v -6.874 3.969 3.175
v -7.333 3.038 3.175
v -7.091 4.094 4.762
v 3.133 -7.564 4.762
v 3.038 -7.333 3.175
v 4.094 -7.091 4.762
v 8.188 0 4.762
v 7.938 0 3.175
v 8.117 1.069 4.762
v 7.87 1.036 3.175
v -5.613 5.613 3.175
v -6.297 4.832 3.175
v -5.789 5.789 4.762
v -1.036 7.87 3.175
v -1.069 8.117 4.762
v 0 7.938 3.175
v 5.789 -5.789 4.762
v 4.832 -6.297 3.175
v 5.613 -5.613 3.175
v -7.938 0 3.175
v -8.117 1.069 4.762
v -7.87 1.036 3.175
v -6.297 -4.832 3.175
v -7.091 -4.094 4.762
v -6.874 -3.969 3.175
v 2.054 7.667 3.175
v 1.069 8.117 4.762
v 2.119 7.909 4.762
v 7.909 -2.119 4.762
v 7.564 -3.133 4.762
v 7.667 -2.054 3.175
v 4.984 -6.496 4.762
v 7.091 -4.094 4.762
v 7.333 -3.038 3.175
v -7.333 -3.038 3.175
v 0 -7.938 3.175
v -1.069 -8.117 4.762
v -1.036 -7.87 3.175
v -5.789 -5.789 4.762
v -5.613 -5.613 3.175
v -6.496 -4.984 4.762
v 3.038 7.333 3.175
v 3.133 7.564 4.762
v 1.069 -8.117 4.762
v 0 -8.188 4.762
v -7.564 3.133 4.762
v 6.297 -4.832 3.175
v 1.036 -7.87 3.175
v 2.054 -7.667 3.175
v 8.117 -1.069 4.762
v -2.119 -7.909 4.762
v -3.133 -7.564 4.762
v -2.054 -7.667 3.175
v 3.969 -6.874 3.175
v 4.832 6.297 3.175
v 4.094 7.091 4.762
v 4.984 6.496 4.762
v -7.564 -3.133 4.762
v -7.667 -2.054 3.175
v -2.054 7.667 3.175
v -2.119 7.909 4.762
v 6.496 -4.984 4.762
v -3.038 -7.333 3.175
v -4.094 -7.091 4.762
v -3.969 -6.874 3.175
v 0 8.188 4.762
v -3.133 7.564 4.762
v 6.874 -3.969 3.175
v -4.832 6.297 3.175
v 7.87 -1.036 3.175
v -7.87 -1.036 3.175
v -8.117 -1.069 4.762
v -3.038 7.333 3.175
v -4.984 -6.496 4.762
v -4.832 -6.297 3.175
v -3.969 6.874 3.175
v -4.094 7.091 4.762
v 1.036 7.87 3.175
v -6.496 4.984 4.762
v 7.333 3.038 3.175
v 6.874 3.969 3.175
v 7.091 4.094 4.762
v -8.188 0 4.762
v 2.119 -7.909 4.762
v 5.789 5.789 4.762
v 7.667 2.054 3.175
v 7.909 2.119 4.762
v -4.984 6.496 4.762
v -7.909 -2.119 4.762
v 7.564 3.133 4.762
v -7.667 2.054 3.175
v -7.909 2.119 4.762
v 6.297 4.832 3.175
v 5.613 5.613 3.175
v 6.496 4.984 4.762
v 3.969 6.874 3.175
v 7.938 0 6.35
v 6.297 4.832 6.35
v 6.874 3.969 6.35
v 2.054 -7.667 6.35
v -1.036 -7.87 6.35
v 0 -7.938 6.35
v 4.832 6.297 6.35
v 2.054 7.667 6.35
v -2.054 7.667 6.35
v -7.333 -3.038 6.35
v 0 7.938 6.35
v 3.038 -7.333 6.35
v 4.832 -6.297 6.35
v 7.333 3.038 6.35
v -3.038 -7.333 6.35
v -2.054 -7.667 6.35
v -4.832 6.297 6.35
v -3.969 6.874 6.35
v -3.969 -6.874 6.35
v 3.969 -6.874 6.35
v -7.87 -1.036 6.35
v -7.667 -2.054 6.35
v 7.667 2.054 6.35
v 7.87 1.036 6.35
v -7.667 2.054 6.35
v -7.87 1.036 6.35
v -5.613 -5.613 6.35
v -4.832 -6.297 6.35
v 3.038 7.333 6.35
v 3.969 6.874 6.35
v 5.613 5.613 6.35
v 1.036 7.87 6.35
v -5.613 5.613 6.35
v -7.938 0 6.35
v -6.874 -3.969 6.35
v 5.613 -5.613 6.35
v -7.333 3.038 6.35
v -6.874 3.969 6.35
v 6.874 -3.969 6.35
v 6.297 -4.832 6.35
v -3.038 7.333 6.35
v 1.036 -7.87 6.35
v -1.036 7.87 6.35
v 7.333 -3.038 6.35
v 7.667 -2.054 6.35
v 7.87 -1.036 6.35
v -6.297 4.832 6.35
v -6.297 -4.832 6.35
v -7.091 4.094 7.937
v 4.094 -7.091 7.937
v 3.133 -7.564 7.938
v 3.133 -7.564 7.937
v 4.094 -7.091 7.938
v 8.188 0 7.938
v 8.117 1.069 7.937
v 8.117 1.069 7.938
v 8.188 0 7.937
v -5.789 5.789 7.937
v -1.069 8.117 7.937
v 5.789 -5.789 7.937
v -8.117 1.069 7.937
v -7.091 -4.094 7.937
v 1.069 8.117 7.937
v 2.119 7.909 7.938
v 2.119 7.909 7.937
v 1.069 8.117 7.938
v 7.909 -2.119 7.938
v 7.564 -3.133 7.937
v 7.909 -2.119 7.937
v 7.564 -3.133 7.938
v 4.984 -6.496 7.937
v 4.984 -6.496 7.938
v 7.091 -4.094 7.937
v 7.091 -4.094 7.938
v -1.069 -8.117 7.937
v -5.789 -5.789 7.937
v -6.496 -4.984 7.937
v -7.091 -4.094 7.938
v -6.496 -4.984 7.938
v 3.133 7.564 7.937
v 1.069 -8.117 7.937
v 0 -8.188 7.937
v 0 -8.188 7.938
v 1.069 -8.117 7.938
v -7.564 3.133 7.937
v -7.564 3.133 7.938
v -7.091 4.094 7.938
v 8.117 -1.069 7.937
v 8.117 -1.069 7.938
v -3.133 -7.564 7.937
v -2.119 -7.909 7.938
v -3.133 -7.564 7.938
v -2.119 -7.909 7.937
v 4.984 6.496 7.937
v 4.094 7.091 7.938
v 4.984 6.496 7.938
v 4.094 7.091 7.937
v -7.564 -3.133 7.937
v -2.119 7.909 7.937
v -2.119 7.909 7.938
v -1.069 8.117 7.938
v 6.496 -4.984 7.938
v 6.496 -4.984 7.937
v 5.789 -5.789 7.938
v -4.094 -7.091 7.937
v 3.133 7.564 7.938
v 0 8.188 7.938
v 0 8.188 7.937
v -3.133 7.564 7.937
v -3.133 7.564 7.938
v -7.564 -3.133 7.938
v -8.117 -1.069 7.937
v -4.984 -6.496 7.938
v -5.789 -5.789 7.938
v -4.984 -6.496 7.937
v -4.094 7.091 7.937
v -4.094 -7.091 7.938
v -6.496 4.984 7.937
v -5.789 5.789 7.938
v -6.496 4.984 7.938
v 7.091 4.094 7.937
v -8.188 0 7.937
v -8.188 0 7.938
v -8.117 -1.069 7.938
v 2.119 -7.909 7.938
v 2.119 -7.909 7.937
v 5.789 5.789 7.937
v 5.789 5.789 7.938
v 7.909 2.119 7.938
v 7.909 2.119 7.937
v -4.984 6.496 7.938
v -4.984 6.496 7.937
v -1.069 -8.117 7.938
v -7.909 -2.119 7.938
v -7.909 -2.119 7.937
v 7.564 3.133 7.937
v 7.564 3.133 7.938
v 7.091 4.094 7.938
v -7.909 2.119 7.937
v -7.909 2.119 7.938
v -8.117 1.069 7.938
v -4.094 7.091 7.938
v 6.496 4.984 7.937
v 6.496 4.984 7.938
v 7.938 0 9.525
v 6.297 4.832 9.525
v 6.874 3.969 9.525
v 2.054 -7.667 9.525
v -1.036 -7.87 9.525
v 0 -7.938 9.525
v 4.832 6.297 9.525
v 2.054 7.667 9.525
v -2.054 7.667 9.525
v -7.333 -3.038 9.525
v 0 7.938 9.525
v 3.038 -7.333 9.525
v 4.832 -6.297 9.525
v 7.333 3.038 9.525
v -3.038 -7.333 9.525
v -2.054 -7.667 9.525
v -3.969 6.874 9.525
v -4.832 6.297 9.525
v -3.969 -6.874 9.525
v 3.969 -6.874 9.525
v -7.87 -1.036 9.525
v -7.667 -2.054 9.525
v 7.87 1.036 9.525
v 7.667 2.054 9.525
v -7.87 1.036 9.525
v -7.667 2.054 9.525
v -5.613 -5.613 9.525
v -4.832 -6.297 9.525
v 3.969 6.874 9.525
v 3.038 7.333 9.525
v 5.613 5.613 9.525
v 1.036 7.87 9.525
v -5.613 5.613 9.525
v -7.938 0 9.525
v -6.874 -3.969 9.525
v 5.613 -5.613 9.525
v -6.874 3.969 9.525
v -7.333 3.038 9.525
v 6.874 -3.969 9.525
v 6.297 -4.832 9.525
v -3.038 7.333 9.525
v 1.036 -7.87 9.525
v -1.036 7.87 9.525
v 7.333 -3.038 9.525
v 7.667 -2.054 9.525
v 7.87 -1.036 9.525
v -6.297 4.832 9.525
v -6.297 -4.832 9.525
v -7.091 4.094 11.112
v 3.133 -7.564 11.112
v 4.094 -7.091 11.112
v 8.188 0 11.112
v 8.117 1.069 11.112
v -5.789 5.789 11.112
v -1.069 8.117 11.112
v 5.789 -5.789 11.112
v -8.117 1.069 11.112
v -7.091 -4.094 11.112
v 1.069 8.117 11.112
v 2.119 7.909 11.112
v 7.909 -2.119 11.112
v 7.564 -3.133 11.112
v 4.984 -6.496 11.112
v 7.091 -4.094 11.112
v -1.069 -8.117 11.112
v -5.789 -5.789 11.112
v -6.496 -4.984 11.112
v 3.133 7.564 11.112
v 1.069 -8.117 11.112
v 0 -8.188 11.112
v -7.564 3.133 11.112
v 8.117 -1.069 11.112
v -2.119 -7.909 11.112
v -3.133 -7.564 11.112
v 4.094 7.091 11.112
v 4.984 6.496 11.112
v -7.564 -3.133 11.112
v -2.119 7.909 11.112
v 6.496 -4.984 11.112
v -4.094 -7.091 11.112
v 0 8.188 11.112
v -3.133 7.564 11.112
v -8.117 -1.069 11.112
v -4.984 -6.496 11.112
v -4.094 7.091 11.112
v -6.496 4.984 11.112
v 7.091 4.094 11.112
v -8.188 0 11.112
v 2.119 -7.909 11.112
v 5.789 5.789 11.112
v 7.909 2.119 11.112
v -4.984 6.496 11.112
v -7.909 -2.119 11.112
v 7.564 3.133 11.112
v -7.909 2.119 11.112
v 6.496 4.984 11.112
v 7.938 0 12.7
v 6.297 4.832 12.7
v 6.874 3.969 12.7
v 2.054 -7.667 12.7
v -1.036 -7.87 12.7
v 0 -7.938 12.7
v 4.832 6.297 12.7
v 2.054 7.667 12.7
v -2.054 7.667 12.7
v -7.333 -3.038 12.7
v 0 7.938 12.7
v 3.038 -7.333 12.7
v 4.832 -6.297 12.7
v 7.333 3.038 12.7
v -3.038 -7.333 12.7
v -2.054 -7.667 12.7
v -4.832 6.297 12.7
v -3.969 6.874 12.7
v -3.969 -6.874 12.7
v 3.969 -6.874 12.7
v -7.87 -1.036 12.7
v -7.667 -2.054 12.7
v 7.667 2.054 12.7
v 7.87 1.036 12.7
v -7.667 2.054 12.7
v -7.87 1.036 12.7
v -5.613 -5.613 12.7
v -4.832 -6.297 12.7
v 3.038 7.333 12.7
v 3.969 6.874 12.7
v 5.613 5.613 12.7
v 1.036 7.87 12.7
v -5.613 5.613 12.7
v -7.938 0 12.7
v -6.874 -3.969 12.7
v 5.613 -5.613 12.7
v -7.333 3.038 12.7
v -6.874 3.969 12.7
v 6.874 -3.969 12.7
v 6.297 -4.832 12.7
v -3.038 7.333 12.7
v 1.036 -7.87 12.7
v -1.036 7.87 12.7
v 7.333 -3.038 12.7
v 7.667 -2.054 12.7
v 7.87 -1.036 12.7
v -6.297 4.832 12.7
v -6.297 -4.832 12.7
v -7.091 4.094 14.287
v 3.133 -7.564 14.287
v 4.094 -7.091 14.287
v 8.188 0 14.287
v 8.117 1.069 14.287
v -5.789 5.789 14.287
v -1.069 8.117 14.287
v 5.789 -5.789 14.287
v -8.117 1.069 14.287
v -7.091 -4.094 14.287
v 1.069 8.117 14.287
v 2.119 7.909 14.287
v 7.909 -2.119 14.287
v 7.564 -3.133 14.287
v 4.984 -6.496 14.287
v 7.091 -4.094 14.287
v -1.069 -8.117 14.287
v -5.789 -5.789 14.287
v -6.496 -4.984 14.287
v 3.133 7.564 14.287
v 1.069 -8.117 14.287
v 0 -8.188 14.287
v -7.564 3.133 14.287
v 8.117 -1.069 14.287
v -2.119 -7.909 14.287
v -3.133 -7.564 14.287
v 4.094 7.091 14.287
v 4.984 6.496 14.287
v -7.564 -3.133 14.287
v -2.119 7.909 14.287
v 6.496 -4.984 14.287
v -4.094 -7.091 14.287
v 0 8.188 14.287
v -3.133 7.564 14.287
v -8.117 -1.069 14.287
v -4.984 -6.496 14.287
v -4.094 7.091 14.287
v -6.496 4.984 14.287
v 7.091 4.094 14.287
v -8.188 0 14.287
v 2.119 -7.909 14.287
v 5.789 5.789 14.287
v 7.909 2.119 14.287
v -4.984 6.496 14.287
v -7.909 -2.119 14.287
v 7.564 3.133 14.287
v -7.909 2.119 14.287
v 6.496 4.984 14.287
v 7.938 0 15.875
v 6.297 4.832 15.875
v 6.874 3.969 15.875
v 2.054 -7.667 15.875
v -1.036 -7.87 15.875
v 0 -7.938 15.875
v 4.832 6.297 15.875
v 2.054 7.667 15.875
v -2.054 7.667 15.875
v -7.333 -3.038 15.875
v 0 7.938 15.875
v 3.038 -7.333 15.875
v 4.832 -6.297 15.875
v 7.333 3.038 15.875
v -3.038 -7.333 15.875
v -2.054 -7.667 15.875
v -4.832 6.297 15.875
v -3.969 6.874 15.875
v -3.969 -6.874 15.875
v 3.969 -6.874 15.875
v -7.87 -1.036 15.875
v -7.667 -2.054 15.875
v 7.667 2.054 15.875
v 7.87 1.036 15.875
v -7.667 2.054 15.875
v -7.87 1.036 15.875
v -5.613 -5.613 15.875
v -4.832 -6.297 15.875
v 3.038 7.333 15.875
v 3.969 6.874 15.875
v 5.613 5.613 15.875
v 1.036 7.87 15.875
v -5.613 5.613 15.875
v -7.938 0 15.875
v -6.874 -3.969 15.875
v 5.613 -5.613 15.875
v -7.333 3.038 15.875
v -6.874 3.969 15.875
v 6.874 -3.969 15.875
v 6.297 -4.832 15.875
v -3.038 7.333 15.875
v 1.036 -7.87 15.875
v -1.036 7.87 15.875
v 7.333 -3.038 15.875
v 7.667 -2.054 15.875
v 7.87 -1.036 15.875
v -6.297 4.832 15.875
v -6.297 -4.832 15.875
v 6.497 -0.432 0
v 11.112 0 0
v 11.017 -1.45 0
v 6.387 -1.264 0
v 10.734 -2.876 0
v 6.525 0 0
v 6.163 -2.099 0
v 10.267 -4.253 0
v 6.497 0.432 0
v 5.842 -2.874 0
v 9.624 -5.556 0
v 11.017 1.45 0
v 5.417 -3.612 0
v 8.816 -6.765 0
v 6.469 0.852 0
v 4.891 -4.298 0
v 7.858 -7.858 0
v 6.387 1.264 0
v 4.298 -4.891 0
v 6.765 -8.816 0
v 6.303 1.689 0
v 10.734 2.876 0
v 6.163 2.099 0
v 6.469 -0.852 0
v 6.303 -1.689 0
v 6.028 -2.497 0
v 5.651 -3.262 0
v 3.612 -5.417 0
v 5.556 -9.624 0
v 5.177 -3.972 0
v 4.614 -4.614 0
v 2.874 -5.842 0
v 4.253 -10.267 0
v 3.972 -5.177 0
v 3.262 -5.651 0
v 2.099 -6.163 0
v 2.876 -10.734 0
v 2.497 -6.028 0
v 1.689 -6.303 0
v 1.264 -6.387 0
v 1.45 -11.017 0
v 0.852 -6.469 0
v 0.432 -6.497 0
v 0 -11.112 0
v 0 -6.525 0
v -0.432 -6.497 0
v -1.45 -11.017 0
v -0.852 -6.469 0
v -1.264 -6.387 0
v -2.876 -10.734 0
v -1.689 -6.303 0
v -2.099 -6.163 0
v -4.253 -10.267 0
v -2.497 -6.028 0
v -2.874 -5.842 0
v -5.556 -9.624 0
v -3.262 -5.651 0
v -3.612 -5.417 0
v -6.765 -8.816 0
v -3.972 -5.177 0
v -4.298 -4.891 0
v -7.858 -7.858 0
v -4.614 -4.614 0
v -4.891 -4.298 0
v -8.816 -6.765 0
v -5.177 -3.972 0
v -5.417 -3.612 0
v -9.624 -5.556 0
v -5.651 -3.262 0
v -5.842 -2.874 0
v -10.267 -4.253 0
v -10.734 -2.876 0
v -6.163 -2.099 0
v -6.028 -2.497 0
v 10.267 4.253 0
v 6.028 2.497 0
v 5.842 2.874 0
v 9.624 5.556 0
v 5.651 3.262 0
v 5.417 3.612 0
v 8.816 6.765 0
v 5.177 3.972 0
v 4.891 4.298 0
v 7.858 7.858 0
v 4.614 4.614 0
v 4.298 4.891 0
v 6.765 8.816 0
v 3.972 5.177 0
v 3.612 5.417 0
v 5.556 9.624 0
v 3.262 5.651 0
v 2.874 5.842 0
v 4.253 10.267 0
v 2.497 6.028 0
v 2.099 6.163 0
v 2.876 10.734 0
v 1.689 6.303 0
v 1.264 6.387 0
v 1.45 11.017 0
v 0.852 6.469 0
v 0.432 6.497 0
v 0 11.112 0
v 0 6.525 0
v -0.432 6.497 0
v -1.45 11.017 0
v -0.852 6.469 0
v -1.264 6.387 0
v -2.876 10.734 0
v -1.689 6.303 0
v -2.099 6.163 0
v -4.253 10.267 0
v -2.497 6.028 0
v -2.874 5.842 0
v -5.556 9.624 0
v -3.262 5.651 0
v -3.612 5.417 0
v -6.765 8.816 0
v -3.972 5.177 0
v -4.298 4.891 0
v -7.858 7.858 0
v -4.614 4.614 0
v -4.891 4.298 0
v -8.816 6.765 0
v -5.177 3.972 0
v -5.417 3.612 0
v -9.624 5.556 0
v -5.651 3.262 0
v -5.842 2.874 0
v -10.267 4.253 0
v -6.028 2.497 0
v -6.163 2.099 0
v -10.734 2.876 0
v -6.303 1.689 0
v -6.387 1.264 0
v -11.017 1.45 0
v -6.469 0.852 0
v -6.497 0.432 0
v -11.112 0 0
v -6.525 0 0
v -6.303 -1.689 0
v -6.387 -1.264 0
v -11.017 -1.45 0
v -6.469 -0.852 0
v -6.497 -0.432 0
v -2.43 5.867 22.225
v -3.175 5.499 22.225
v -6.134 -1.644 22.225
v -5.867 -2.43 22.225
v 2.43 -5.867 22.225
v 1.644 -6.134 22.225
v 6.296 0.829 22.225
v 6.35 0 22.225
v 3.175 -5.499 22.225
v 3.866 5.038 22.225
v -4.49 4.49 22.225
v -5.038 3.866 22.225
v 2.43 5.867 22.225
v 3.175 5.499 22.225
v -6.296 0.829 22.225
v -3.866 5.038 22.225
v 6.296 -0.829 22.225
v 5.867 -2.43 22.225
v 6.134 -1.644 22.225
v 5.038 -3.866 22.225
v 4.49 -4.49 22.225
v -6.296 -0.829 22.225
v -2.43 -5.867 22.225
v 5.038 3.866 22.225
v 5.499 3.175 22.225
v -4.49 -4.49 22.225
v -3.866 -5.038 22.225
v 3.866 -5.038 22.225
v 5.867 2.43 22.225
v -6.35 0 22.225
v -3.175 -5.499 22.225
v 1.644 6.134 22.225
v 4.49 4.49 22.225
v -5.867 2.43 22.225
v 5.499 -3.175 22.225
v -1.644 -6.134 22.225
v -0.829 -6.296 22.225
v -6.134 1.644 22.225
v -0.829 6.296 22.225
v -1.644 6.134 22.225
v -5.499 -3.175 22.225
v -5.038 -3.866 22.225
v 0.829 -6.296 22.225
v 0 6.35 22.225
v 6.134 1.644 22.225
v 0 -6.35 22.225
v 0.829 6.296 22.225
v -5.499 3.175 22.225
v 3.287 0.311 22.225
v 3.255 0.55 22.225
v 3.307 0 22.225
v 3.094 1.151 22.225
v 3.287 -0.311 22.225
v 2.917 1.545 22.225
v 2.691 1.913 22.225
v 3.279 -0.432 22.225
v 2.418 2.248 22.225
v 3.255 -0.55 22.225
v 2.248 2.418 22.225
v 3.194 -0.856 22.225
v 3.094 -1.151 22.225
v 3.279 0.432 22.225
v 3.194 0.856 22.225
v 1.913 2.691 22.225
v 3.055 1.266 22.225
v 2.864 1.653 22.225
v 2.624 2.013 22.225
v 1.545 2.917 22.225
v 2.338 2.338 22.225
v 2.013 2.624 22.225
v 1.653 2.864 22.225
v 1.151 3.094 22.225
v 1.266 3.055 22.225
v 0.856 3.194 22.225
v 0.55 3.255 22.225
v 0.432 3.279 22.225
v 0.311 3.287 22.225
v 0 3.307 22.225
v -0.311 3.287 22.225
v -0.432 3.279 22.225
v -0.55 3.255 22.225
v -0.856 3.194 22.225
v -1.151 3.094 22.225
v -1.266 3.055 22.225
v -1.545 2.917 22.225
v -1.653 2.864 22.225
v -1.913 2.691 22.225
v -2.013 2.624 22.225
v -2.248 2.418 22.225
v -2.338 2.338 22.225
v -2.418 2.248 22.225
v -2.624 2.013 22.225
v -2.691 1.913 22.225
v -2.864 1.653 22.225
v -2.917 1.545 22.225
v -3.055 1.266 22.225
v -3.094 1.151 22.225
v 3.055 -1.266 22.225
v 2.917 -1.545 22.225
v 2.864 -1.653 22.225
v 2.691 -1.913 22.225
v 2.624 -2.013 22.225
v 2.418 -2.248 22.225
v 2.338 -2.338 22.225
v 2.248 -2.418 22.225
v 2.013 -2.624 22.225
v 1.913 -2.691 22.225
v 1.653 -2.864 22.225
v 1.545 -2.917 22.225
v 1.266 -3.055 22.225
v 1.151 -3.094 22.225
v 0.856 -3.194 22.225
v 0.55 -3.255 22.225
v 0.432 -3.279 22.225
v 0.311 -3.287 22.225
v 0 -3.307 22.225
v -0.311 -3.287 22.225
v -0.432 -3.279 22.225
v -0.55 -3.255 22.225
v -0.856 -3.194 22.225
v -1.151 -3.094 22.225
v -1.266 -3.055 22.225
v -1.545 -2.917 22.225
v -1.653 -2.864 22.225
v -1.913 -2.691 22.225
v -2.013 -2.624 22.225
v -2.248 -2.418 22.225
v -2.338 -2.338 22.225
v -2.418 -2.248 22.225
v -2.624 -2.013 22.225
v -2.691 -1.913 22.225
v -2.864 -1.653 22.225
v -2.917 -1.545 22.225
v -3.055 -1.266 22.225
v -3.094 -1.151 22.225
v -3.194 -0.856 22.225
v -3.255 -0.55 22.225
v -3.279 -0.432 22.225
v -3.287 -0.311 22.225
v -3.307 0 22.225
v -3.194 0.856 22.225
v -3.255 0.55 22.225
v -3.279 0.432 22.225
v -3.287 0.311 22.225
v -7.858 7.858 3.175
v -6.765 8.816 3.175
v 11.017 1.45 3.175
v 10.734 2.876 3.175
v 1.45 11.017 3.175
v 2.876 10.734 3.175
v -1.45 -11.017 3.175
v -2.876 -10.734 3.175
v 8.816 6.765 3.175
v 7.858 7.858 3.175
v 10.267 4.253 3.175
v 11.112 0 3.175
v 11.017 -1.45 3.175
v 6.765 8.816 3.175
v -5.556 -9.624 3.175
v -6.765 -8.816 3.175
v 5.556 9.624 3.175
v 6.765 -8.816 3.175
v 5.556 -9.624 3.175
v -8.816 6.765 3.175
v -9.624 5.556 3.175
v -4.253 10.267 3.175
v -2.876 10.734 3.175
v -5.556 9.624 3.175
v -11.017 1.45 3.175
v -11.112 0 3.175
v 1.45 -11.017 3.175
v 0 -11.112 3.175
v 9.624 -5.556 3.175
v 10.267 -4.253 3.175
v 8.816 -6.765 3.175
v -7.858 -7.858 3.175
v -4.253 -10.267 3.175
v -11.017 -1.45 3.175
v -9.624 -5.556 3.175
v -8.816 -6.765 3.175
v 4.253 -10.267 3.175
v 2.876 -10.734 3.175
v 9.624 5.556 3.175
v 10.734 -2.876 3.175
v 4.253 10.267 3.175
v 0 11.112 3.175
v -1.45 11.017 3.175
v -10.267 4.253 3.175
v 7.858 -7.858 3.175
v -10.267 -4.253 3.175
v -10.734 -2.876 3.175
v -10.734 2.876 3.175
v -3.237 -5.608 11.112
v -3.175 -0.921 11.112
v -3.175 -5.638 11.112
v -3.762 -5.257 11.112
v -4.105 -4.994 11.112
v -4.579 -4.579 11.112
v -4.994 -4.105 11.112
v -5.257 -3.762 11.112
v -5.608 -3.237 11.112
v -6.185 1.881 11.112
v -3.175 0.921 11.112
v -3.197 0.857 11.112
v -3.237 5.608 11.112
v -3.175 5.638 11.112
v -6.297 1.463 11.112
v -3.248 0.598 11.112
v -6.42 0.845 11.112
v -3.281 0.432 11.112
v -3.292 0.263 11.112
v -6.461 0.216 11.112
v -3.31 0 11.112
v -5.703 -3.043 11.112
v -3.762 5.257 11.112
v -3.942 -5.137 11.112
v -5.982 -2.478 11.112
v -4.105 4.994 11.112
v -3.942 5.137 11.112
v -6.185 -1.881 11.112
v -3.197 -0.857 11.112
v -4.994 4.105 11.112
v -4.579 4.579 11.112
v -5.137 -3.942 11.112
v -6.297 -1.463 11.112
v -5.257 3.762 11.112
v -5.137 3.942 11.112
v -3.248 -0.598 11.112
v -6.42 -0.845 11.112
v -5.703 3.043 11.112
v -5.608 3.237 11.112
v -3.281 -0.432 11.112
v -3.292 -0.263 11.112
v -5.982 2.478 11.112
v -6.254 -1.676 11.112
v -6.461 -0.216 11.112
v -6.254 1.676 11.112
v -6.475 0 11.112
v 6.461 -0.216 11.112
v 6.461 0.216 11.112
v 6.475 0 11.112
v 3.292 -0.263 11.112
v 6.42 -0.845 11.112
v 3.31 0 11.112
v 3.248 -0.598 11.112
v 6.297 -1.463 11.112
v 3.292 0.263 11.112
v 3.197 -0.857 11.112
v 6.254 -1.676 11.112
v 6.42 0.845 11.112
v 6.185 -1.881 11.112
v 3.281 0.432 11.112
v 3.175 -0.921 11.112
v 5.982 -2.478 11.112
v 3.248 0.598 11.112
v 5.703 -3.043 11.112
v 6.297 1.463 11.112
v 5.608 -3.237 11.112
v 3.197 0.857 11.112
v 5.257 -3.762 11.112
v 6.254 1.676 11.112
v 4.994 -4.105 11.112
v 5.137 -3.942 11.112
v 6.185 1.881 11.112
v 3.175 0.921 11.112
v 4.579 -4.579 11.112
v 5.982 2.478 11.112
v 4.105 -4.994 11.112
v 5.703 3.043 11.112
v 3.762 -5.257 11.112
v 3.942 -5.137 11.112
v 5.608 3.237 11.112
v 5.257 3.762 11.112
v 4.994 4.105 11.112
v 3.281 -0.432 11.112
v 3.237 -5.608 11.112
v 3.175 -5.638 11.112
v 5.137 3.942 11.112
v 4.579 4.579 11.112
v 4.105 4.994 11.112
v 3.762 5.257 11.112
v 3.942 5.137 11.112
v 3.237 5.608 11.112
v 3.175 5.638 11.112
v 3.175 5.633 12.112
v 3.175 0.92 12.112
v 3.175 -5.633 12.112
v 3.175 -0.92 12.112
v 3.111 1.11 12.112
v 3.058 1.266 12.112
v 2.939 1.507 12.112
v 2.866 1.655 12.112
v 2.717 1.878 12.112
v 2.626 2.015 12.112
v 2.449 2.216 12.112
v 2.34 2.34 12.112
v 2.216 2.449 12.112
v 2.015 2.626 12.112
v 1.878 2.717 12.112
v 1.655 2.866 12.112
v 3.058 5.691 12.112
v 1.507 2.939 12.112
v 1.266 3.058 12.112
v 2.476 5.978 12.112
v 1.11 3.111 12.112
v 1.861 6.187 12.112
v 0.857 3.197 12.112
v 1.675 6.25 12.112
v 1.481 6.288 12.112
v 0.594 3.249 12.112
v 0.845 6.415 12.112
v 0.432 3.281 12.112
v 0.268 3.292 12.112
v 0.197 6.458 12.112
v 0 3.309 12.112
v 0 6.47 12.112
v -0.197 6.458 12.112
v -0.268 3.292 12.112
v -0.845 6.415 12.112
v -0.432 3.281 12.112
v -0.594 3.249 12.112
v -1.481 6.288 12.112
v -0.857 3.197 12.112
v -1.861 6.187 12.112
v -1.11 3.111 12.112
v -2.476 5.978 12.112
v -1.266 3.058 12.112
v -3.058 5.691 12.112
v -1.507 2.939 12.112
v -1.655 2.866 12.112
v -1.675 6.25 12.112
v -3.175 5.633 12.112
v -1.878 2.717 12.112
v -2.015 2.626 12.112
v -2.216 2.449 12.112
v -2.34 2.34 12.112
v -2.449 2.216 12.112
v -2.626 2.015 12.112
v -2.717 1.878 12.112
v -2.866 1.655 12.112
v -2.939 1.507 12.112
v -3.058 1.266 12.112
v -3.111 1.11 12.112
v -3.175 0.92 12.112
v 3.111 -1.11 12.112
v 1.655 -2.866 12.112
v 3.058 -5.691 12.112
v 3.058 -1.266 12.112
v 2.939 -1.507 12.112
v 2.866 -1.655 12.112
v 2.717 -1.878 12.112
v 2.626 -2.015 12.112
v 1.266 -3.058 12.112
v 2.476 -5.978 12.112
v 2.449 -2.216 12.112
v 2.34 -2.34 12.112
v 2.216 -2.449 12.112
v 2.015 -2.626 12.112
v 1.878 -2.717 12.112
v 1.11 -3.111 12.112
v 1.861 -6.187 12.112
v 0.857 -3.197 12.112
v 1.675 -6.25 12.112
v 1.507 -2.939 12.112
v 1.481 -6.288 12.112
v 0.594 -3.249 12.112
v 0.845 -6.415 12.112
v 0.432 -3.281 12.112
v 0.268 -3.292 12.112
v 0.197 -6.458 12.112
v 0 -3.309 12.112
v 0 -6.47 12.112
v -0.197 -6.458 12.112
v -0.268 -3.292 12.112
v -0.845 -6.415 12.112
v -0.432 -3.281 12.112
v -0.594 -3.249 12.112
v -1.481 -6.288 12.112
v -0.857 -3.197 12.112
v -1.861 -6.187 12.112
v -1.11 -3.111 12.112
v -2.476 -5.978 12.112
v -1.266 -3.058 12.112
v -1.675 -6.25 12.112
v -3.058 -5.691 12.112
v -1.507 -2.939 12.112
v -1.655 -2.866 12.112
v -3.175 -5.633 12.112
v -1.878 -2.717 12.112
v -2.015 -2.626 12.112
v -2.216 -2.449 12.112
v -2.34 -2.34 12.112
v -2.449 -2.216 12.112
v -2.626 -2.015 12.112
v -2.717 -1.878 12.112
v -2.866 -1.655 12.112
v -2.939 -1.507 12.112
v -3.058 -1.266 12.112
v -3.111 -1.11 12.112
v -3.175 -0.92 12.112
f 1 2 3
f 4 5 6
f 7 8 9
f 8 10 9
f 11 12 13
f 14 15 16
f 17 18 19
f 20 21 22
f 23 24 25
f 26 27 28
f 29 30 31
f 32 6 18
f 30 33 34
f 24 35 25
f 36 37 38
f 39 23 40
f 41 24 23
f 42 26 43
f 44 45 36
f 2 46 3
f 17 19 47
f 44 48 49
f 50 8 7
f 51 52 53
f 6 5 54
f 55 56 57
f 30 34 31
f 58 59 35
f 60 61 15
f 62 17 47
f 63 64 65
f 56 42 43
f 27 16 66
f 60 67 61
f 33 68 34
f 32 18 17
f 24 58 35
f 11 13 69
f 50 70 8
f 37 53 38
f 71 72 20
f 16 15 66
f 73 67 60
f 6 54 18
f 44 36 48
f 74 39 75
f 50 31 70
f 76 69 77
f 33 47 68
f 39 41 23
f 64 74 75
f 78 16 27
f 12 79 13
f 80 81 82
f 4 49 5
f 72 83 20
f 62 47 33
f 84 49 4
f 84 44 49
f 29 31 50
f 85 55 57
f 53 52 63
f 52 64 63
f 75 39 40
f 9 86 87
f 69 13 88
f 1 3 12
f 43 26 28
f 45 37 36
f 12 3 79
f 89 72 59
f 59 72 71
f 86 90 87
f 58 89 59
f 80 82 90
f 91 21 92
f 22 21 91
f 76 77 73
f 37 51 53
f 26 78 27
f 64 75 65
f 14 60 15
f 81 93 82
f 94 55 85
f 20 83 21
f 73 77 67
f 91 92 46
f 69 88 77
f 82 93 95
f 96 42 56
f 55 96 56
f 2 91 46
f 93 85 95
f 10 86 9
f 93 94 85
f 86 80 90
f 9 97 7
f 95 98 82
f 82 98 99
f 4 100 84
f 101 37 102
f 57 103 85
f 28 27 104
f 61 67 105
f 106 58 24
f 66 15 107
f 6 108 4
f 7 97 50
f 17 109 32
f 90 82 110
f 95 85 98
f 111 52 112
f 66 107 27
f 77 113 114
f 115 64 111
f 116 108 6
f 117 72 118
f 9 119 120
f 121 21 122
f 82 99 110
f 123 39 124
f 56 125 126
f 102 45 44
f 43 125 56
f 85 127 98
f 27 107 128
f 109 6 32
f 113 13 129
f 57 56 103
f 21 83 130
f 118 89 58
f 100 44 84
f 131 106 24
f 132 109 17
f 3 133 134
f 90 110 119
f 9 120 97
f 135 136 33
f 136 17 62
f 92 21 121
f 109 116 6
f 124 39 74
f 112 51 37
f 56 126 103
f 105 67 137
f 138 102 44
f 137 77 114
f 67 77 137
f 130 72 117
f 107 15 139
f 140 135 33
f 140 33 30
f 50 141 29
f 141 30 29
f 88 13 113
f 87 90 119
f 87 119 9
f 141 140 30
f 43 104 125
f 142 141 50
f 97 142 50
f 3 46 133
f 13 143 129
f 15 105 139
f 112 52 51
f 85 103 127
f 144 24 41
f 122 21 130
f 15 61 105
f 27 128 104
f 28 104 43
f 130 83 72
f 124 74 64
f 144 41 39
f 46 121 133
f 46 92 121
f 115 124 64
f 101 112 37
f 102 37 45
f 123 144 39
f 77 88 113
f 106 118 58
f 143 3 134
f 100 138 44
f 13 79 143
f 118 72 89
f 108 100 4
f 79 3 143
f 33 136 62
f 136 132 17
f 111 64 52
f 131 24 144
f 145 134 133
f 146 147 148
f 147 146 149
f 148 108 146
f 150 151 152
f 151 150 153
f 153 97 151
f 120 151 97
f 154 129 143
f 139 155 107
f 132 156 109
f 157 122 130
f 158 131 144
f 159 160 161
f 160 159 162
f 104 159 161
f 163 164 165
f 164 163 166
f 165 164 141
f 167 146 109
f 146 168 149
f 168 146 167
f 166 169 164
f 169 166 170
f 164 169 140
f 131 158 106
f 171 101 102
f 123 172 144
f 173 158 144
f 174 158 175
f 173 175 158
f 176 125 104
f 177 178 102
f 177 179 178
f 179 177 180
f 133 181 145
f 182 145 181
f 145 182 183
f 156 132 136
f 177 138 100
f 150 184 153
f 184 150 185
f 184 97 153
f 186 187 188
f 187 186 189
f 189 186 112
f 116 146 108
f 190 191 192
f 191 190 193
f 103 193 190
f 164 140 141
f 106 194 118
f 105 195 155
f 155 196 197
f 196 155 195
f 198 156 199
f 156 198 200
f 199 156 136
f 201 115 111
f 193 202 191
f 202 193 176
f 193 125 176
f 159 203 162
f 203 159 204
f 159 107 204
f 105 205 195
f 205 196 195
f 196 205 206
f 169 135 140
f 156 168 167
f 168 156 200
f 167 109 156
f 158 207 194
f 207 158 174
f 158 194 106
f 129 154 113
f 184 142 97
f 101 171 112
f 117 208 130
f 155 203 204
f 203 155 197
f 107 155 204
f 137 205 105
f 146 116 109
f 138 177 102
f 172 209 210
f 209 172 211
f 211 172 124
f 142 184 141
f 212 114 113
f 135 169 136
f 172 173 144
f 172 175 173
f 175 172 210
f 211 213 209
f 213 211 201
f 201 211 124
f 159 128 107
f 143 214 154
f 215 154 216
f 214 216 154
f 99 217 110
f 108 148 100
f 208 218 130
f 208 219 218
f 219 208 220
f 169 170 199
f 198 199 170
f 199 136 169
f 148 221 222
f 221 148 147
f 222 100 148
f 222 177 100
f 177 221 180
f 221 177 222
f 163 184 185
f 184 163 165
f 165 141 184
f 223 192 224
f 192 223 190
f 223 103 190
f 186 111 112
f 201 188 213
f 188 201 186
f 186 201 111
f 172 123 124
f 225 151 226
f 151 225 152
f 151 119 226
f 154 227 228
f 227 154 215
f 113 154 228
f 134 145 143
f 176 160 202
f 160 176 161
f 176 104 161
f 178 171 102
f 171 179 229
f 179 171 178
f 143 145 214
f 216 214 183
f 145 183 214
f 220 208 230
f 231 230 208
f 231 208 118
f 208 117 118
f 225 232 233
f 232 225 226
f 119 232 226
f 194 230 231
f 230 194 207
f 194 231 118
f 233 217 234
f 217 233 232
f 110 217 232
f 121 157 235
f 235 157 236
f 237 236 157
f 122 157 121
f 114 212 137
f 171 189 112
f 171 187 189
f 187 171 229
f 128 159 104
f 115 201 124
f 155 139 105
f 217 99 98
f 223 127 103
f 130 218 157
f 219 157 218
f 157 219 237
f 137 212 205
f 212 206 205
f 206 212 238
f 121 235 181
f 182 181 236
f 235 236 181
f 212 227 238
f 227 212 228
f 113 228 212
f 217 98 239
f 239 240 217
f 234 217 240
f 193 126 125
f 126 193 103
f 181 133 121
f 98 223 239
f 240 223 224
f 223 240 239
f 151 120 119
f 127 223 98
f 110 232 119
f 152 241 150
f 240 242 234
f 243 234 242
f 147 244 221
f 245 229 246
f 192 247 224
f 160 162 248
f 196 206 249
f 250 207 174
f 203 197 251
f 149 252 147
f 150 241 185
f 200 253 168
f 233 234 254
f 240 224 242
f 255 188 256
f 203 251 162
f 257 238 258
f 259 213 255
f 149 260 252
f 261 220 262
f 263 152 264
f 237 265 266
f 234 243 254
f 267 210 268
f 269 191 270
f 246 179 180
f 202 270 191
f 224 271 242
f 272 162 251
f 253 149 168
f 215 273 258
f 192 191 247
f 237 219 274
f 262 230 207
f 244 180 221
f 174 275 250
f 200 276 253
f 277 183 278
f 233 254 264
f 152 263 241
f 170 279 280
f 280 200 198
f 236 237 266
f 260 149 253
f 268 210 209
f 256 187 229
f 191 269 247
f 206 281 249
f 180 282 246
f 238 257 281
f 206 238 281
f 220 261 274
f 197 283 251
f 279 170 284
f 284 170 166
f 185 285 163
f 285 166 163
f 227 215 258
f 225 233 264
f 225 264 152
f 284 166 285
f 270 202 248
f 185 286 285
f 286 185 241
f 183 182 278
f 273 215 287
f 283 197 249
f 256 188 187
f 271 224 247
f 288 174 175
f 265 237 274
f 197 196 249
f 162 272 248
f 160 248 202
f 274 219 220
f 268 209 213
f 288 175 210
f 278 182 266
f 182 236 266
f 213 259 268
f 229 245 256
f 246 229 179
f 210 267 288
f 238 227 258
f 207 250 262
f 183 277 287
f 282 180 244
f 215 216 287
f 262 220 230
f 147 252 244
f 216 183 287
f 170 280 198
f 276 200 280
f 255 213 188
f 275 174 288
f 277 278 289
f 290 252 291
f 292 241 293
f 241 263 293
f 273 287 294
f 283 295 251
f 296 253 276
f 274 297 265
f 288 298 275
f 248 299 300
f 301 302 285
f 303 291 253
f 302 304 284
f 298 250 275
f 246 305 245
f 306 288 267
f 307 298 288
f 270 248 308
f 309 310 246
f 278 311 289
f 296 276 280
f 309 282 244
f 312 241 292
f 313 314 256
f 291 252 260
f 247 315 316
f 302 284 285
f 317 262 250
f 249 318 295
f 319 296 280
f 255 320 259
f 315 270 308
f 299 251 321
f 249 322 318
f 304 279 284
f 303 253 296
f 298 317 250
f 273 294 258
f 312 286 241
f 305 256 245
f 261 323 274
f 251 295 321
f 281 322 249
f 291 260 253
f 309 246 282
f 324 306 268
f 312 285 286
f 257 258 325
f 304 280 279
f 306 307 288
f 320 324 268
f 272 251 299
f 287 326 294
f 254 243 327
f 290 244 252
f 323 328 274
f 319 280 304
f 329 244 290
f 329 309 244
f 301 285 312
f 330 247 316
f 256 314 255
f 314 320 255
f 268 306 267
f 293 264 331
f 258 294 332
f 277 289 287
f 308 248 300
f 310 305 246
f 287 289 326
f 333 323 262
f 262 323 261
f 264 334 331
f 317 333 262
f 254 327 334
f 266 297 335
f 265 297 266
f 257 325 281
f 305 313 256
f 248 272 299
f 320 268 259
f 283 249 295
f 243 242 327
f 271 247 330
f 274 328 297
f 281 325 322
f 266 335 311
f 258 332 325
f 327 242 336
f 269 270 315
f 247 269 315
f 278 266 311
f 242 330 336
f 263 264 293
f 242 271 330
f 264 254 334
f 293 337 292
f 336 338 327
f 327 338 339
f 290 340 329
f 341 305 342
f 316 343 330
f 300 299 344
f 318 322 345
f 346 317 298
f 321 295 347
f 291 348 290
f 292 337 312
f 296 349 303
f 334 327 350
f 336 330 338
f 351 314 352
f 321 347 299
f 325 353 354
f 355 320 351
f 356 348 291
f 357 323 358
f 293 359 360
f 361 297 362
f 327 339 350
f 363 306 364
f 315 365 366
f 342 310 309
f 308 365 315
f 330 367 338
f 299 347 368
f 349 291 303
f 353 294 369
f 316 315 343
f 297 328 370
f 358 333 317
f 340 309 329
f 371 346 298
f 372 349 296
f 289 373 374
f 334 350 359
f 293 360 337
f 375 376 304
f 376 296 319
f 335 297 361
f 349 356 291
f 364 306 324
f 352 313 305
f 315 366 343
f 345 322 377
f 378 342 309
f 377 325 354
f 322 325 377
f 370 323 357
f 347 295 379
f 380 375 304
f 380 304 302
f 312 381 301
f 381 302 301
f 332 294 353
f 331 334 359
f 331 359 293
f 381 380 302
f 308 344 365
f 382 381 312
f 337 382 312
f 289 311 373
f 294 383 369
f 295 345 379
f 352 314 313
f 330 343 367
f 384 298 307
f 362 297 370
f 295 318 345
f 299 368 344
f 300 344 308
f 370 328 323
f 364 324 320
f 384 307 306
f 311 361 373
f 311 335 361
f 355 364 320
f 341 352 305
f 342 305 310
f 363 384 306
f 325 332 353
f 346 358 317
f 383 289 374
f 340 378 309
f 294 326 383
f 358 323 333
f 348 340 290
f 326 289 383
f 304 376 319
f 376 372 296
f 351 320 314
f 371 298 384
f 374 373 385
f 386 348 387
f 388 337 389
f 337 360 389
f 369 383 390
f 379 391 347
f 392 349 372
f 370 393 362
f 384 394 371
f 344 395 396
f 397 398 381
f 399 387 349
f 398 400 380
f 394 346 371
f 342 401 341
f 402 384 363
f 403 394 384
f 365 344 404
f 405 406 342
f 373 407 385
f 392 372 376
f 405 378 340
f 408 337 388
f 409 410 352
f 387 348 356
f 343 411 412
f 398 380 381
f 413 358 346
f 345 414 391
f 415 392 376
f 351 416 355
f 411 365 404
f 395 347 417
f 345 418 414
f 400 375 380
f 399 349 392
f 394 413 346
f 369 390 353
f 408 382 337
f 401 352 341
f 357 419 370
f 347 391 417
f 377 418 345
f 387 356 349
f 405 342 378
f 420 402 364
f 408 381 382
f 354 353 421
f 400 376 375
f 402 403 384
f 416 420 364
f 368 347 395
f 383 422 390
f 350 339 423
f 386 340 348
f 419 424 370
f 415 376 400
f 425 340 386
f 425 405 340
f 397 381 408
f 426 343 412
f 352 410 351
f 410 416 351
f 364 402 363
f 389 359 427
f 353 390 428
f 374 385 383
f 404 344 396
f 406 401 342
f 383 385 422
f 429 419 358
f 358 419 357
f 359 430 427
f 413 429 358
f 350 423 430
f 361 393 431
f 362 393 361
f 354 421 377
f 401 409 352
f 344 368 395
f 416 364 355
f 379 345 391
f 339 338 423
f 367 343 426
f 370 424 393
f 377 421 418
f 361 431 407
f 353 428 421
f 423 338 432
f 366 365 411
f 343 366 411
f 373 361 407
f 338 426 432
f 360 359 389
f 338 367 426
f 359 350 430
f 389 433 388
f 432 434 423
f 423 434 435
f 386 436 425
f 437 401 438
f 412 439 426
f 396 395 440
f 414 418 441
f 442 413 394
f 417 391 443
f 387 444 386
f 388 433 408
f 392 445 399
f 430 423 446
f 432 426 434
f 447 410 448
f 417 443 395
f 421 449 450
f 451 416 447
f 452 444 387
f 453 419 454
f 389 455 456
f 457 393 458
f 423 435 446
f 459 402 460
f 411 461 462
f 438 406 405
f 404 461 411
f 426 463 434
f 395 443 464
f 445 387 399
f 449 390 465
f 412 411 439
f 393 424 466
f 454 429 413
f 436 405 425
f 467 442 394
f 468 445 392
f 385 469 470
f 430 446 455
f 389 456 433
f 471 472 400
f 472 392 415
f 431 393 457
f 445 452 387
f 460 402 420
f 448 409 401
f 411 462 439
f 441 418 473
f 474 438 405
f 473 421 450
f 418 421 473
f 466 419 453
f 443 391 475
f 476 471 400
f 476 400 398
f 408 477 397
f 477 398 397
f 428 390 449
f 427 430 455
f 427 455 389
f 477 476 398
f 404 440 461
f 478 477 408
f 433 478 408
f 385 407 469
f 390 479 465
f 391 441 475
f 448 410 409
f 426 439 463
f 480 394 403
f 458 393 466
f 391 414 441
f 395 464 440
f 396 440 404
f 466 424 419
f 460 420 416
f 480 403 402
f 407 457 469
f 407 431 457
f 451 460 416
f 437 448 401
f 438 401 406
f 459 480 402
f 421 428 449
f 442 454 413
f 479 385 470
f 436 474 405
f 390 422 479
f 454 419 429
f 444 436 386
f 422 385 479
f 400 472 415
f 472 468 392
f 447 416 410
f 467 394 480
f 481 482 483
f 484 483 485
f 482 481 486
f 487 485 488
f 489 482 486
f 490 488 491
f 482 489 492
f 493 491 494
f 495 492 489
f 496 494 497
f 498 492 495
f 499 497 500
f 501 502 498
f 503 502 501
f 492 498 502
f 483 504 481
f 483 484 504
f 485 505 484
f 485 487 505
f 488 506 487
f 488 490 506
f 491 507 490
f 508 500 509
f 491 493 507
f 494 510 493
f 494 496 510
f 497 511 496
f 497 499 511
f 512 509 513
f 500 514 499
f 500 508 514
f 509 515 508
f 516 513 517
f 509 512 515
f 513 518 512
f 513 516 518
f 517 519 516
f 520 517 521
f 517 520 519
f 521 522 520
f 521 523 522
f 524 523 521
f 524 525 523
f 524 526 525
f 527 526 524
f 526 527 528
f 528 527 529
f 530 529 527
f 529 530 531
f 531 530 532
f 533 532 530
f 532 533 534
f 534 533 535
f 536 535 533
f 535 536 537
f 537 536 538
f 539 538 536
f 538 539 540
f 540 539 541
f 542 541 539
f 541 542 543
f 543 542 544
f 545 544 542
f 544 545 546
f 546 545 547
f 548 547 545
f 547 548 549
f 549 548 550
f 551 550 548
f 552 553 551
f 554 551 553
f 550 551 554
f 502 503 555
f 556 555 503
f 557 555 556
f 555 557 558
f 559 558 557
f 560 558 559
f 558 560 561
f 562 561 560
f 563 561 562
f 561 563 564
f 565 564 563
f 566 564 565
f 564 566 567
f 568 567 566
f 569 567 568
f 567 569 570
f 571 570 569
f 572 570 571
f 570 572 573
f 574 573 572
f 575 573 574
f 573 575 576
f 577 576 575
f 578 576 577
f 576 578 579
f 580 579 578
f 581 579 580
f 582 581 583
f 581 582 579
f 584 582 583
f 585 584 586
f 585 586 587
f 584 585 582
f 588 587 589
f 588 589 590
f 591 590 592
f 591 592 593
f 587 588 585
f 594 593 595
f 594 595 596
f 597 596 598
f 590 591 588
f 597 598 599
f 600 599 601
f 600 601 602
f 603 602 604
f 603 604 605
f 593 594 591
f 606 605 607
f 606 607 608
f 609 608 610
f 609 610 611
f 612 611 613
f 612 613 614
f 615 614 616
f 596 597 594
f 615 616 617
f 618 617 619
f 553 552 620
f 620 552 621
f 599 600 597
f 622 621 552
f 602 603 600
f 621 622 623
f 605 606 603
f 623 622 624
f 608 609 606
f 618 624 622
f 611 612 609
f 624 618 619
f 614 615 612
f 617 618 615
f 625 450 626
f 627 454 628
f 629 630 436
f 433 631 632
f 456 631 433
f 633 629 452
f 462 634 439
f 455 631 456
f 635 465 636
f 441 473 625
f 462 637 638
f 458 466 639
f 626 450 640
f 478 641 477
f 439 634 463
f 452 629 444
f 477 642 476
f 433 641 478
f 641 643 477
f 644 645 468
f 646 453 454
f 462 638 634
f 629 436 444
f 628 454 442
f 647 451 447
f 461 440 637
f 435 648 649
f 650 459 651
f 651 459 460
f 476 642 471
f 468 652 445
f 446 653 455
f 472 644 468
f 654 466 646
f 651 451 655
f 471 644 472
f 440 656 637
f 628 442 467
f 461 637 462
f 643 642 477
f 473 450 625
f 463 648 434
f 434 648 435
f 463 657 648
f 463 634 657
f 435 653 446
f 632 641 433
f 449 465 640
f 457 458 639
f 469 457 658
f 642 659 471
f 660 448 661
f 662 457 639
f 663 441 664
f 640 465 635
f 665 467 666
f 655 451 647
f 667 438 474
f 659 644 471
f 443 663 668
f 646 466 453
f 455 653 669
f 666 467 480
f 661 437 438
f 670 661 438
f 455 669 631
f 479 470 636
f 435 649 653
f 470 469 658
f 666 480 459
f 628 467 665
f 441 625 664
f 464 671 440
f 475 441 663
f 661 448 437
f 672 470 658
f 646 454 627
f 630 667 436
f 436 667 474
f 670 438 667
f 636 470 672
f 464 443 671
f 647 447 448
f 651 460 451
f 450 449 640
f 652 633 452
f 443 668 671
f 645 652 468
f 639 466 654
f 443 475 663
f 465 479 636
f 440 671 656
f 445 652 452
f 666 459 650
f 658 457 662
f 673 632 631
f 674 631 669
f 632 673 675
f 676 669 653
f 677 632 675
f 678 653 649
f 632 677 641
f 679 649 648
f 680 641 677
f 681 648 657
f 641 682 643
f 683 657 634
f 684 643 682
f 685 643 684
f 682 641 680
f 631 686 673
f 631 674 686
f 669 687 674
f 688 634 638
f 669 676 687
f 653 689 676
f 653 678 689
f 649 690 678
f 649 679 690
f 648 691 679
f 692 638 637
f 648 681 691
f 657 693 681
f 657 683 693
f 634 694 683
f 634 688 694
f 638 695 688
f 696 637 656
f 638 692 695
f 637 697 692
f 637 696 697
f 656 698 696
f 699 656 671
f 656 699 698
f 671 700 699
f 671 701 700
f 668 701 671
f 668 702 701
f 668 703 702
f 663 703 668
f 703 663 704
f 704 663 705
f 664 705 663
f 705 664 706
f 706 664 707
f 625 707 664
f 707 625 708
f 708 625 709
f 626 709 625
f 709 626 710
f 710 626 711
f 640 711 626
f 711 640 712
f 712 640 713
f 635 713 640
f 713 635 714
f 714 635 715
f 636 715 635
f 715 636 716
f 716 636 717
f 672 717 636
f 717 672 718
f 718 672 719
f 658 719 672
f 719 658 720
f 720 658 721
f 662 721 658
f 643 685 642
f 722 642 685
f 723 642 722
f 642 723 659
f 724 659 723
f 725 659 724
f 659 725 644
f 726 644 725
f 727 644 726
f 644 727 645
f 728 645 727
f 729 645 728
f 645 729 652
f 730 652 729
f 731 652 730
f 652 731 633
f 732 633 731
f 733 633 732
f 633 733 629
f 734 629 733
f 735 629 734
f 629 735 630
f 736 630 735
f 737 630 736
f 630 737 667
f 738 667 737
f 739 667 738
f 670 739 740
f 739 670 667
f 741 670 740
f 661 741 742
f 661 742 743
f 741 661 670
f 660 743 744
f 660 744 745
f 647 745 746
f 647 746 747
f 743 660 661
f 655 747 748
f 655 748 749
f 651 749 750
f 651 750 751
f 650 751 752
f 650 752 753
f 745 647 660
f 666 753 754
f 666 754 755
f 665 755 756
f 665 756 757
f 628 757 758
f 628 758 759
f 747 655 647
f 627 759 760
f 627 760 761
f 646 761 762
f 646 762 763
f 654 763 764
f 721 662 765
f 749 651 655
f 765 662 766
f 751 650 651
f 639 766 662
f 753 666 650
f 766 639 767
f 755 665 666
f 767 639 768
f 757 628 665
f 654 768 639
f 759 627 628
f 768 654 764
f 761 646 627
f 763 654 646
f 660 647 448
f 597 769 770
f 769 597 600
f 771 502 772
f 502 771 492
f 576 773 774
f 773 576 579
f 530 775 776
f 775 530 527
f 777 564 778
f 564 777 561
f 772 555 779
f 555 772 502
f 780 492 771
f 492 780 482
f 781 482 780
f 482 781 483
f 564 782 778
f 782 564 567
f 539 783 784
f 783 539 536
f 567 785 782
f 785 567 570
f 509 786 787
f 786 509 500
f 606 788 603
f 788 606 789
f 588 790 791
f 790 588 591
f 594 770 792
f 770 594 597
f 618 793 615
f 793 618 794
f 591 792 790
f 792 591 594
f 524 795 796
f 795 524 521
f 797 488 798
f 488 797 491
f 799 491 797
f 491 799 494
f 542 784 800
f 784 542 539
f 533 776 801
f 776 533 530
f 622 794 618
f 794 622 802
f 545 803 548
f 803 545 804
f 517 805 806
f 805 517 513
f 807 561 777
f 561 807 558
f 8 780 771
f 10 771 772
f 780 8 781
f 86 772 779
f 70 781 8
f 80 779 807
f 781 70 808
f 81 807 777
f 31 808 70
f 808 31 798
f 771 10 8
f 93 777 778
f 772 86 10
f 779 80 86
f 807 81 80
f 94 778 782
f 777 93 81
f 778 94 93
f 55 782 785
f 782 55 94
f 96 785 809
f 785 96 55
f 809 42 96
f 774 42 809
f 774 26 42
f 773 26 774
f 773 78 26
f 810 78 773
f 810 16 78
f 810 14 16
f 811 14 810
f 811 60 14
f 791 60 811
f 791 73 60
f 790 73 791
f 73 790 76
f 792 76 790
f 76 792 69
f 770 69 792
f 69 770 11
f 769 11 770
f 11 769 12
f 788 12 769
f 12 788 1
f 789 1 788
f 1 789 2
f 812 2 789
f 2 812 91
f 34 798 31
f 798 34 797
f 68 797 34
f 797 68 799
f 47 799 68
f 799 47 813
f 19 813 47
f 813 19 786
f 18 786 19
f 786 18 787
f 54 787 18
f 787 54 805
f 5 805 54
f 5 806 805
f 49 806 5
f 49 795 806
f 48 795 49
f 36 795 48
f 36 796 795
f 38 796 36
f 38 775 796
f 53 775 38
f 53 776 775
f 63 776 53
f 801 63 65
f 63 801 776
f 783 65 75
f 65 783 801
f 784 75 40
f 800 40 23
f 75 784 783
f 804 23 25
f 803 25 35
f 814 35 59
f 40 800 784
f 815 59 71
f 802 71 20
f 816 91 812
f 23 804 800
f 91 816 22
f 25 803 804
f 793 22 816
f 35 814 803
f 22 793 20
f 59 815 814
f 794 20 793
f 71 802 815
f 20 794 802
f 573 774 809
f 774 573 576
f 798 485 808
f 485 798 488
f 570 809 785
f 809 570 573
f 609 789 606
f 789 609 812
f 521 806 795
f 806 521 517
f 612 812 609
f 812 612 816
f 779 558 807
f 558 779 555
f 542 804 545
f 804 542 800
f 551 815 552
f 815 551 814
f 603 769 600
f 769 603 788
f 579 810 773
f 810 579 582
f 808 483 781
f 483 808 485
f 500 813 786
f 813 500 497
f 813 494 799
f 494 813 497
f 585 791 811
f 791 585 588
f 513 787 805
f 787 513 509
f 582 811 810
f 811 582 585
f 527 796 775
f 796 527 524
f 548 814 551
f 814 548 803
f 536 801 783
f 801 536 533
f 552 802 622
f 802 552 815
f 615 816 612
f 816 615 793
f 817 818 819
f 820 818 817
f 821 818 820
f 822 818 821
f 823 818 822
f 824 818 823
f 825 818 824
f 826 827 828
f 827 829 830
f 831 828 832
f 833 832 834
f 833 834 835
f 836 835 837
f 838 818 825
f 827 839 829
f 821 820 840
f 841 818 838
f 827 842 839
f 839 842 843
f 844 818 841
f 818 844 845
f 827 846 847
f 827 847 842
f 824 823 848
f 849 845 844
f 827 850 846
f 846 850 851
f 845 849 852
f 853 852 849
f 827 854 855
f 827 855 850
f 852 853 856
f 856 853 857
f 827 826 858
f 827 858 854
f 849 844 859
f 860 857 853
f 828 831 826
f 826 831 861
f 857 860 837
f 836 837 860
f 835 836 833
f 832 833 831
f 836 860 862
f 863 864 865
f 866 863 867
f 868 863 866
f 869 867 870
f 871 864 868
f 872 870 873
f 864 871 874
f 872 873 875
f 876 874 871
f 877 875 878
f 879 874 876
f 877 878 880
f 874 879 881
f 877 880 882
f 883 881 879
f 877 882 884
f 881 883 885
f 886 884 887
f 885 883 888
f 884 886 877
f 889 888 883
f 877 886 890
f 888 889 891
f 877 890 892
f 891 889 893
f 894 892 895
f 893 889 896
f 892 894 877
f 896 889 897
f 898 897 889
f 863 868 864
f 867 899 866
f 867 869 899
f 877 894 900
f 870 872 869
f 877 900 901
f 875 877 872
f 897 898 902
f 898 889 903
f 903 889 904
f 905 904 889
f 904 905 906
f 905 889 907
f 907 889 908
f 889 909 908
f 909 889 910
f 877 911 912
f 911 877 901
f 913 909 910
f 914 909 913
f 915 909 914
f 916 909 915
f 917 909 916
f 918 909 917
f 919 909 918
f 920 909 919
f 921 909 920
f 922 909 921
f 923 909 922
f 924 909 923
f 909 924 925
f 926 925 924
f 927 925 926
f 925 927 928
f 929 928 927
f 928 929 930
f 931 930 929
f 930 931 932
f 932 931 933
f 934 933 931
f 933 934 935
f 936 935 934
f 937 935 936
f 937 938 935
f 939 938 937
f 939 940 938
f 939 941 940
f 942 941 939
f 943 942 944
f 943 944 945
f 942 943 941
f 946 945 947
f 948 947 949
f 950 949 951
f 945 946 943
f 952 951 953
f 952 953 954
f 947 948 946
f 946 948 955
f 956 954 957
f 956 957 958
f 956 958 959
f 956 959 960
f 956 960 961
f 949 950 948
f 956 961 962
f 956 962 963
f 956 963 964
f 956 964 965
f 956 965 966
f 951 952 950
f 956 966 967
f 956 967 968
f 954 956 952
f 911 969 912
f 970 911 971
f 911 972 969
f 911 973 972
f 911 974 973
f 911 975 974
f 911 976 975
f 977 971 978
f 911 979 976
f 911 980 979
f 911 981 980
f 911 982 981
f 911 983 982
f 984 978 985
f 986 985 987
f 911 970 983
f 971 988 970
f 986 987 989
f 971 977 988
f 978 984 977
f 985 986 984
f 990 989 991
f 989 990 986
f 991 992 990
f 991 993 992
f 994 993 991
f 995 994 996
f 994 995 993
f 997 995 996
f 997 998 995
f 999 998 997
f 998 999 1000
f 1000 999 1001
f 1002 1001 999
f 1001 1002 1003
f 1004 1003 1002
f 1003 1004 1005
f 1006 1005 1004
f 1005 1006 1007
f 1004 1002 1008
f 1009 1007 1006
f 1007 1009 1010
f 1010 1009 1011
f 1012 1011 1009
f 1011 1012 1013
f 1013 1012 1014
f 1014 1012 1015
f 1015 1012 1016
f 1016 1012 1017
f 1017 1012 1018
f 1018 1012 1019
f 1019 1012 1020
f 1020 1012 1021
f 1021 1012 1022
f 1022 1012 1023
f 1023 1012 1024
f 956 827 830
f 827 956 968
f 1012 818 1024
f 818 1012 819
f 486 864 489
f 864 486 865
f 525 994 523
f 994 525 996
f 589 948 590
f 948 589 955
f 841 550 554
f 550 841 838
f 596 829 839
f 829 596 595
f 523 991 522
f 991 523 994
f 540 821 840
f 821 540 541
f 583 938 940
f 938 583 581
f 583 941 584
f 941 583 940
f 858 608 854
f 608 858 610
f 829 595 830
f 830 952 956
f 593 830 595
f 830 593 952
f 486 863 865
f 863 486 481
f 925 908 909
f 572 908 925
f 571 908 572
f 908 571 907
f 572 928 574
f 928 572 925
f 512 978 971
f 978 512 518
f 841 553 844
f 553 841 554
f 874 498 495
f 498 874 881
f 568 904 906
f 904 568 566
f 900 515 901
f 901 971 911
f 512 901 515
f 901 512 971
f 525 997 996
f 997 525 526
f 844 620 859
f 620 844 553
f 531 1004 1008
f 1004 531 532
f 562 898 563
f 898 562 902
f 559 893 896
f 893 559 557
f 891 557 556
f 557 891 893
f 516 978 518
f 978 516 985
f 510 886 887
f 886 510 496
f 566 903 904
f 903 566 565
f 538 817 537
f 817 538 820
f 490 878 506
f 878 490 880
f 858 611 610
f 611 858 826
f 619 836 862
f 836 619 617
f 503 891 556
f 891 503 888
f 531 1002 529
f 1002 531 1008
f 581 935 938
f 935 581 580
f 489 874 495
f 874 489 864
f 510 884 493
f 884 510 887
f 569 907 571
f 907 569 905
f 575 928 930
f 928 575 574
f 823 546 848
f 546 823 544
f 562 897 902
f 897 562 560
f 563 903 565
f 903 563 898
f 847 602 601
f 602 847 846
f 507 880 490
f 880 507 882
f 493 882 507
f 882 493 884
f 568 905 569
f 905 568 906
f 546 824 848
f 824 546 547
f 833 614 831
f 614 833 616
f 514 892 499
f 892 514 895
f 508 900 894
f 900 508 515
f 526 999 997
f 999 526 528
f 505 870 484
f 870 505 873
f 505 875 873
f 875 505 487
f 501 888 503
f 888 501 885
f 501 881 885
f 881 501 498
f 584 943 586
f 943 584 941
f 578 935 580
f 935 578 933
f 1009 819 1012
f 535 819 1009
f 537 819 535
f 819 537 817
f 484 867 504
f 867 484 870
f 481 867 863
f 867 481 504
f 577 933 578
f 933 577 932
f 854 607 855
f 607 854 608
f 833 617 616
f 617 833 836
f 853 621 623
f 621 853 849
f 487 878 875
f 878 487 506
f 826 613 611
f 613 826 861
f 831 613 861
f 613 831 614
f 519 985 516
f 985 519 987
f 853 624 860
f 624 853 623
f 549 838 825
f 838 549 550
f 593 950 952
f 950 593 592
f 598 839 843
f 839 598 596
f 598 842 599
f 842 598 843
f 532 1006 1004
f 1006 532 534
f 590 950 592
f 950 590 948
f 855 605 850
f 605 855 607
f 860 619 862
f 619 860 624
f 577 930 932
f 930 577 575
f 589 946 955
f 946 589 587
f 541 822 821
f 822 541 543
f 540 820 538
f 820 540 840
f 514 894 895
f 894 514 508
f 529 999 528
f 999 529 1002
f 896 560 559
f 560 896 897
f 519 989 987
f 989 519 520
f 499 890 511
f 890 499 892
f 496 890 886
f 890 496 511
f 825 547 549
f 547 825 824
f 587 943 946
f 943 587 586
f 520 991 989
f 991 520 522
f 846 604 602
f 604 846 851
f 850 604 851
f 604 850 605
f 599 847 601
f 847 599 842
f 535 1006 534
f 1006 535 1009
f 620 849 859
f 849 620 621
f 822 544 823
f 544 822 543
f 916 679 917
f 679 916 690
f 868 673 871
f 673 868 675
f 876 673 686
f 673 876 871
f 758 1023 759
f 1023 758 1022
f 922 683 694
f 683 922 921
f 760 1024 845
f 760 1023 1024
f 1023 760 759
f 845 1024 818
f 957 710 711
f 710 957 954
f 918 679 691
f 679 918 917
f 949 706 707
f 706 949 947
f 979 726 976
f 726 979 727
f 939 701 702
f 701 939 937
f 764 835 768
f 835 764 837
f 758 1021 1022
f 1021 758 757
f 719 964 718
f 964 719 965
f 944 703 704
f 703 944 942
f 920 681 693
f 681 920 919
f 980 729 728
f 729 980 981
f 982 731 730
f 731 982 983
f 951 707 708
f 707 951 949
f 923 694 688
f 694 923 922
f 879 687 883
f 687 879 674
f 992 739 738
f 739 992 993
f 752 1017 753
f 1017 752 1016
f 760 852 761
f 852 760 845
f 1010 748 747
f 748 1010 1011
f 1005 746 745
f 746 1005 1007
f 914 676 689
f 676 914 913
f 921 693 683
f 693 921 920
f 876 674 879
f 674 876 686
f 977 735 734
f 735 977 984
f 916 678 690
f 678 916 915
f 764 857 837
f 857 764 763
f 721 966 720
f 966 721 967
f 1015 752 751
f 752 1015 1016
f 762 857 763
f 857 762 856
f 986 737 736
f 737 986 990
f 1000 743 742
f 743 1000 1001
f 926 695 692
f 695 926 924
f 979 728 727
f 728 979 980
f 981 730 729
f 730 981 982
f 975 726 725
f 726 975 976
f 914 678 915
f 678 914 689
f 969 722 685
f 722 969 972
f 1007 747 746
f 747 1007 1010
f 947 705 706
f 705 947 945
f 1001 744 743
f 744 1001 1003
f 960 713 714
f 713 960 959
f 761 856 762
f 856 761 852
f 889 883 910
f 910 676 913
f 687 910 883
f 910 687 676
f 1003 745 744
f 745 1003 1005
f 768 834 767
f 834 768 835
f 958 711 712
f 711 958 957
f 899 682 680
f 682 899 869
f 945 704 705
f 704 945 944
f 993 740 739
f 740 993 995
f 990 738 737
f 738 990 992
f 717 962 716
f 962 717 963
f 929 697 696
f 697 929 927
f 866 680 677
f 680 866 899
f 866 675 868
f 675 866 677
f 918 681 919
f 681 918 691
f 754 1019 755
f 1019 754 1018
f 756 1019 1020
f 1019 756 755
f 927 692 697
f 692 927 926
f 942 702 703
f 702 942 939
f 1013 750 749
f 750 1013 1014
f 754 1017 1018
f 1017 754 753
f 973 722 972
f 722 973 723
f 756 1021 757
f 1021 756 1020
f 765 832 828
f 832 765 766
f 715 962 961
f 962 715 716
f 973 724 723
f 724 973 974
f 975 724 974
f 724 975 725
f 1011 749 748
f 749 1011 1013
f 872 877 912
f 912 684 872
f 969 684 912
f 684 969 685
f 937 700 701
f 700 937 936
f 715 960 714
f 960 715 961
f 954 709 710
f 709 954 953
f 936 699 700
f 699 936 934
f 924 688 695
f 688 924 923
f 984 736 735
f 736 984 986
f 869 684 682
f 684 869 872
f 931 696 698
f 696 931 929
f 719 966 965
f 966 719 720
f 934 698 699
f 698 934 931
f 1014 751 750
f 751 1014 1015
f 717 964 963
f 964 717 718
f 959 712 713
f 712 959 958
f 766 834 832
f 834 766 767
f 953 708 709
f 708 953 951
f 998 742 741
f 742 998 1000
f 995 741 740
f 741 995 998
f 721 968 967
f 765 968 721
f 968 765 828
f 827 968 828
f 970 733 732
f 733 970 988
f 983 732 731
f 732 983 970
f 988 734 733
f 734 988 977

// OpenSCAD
// v1.2:
// - Configurable sizes, yo
// v1.3:
// - Fix some calculations that I had b0rked up lmao
// v1.4:
// - Fix that small and large offsets were swapped oops
// v1.5:
// - Add taper to holes

inch = 25.4;

rib_thickness = 1/8*inch;
rib_protrusion = 0.25;

small_id_offset  = 0.25; // 0.01
// Additional diameter offset at mouth for taper
small_id_offset2 = 0.1; // 0.01
large_id_offset  = 0.25; // 0.01
// Additional diameteroffset at mouth for taper
large_id_offset2 = 0.1; // 0.01
od_offset        = 0.00; // 0.01

$fn = 48;

small_id = 1/4*inch + small_id_offset;
large_id = 1/2*inch + large_id_offset;
large_depth = 7/16*inch;

difference() {
	union() {
		shaft_d   = 5/8*inch + od_offset;
		tapered_d = 4/8*inch + od_offset;
		shaft_length = 3/4*inch;
		taper_length = 1/4*inch;
		flange_d = 7/8*inch;
		flange_thickness = 1/8*inch;
		rib_d2 = 5/8*inch+rib_protrusion*2 + od_offset;
		// Main shaft
		cylinder(d=shaft_d, h=flange_thickness+shaft_length-taper_length);
		// Taper
		translate([0,0,flange_thickness+shaft_length-taper_length]) cylinder(d1=shaft_d, d2=tapered_d, h=taper_length);
		cylinder(d=flange_d, h=flange_thickness);
		for( i=[0:1:floor((shaft_length-taper_length)/rib_thickness)] ) {
			translate([0,0,flange_thickness+rib_thickness*i])
				cylinder(d1=shaft_d, d2=rib_d2, h=rib_thickness/2);
			translate([0,0,flange_thickness+rib_thickness*(i+0.5)])
				cylinder(d2=shaft_d, d1=rib_d2, h=rib_thickness/2);
		}
	}
	//cylinder(d=1/2*inch, h=7/8*inch, center=true);
	intersection() {
		cylinder(d1=large_id + large_id_offset2*3, d2=large_id-large_id_offset2*1, h=large_depth*4, center=true);
		// 'Overhang remedy'
		union() {
			cube([100,100,large_depth*2], center=true);
			cube([1/4*inch,100,large_depth*2+2], center=true);
		}
	}
	translate([0,0,]) cylinder(d1=small_id + small_id_offset2/2, d2=small_id, h=100, center=true);
}
